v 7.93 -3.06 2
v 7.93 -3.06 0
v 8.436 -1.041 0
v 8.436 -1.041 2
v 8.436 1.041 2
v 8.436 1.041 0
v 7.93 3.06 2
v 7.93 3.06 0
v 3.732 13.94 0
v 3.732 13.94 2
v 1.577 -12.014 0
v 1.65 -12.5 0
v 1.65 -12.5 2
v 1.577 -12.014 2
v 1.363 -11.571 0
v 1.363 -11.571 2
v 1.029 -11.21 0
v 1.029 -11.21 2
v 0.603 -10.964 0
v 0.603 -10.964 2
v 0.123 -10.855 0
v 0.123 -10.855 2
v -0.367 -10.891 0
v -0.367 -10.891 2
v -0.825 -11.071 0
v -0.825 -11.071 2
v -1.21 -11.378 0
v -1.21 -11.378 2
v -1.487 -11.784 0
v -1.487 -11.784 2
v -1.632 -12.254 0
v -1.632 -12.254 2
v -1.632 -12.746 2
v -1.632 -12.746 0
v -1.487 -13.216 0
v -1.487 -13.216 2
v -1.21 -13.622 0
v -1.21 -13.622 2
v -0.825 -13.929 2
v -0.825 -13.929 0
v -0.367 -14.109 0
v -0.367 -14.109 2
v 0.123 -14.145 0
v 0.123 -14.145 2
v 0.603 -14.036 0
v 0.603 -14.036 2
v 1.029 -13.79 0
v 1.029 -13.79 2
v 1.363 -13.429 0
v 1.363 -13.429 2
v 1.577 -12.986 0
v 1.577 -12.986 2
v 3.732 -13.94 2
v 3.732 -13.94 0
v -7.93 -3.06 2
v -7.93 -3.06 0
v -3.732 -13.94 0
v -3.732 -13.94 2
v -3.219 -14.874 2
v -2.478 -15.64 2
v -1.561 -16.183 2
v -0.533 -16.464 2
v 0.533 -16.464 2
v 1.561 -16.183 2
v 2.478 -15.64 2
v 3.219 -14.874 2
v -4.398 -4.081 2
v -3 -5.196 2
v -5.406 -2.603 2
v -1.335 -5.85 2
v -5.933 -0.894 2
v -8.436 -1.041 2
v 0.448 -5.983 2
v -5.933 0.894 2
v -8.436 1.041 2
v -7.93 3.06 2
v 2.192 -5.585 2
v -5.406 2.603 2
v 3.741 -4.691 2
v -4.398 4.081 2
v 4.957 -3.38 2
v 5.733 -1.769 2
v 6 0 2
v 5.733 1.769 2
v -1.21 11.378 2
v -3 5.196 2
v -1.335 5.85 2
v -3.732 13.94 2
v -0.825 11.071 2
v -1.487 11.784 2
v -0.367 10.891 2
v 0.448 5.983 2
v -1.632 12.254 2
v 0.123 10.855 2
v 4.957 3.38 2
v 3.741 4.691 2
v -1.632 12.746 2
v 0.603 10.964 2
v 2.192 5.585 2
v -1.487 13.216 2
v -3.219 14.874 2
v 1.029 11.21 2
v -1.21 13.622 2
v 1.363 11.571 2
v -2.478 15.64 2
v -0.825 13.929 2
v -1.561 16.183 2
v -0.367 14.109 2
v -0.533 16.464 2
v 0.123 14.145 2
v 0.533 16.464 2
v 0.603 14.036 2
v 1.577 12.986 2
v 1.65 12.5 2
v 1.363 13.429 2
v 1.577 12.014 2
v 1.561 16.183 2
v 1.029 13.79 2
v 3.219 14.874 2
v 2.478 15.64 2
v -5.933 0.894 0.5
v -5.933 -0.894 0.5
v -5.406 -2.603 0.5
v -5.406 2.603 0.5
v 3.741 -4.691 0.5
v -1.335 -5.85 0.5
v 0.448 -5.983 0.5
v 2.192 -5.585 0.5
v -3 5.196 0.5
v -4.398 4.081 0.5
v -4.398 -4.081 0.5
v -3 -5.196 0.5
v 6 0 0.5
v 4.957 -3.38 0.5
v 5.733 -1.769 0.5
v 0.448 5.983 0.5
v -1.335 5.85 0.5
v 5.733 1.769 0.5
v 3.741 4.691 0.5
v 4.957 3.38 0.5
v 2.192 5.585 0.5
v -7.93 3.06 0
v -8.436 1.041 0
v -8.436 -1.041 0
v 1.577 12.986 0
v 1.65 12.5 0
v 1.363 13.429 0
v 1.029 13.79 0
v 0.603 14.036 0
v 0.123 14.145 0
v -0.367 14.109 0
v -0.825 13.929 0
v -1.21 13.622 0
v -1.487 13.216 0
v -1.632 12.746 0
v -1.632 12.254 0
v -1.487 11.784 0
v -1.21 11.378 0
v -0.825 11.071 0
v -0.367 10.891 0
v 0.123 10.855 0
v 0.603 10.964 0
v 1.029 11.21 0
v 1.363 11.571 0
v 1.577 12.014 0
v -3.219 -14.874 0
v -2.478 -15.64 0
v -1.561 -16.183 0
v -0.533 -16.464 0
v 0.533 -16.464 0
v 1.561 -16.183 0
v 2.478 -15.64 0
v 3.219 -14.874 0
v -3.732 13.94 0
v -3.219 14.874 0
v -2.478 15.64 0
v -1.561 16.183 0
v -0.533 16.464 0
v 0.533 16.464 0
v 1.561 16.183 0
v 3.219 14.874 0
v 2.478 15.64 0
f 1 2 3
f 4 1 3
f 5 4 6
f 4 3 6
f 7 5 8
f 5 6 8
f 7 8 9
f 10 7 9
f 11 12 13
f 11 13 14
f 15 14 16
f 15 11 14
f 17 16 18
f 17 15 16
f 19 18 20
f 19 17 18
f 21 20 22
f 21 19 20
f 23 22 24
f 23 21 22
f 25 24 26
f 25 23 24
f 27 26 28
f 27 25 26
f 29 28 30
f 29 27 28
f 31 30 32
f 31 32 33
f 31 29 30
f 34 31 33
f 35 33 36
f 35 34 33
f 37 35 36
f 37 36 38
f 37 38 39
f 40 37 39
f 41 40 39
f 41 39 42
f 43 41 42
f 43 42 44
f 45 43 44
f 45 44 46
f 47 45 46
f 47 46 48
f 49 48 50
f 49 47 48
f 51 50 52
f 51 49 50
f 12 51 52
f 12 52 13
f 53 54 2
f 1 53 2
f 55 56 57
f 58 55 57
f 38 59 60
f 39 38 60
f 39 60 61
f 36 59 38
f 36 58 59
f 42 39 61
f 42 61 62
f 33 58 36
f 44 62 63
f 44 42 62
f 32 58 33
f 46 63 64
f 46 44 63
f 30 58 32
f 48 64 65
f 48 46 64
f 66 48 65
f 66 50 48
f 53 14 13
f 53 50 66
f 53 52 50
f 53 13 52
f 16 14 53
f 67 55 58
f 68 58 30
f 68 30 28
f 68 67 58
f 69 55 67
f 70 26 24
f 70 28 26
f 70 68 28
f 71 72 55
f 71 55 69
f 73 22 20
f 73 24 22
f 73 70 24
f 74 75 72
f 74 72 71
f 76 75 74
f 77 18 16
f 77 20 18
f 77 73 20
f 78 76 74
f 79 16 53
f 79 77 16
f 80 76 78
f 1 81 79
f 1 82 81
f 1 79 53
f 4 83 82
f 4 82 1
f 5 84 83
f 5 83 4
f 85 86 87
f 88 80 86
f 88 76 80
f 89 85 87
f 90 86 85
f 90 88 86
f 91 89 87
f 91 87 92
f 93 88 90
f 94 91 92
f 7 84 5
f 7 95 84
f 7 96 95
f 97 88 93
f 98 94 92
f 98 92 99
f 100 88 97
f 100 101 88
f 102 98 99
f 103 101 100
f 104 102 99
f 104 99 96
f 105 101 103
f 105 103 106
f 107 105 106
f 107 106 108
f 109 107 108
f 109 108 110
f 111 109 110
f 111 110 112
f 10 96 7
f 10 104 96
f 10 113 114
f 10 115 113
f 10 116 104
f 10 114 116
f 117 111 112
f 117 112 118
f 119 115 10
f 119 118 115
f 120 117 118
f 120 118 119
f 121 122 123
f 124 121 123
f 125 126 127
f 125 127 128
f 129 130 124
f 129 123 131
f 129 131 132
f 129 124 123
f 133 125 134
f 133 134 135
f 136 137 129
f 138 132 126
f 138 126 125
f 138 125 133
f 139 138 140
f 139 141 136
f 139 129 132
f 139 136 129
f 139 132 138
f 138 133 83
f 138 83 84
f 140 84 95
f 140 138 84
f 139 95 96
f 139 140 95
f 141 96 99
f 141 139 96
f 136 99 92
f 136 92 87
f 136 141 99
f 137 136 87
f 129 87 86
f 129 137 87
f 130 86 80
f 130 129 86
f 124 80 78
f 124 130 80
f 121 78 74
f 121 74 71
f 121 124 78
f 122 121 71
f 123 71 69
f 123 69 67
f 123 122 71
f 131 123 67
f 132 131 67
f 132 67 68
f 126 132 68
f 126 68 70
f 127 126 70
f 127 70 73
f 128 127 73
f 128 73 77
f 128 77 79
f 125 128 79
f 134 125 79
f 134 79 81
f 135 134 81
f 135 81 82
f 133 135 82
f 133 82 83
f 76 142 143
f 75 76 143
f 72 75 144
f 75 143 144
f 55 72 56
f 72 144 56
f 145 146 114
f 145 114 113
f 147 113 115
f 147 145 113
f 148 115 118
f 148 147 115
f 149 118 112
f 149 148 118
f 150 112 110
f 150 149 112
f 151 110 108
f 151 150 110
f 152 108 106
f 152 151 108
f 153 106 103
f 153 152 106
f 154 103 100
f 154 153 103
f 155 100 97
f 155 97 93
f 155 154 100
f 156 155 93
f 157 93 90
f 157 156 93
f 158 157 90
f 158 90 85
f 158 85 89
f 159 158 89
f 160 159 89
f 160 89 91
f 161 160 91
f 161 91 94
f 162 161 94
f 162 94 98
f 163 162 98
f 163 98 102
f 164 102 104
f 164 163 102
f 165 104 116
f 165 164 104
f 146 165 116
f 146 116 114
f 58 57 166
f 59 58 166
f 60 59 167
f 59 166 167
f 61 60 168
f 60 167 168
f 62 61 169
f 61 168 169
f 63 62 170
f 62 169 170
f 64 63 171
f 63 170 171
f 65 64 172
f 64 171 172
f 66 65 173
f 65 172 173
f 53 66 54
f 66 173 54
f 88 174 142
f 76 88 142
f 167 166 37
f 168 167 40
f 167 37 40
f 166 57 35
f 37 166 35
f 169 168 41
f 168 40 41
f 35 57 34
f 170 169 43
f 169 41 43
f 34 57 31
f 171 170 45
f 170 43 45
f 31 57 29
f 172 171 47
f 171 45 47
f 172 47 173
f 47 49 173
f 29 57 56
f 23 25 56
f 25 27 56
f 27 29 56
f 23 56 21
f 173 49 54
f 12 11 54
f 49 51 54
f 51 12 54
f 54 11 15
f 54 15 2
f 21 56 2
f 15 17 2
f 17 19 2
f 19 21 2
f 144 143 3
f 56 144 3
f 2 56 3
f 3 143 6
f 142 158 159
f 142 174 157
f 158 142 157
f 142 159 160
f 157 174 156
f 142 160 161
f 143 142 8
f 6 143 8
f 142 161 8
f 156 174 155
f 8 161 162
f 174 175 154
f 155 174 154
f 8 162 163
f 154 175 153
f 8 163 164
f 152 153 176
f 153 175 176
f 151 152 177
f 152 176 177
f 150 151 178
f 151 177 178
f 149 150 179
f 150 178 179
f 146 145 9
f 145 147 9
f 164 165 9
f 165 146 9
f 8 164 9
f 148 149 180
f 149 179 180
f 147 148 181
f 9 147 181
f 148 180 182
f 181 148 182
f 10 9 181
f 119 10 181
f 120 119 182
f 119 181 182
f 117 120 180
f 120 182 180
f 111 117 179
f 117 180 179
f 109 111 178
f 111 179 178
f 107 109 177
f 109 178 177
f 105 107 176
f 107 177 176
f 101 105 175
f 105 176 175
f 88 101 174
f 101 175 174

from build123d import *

# Parameters (mm, degrees)
F0_R     = 1.65
F0_R_2   = 6
F1_DEPTH = 2
F2_DEPTH = 0.5


with BuildPart() as f1:
    # F0 (on Top) → F1 (new body)
    with BuildSketch(Plane.XY):
        with BuildLine():
            Line((-3.731809, 13.94), (-7.930095, 3.06))
            ThreePointArc((-7.930095, 3.06), (-8.5, 0), (-7.930095, -3.06))
            Line((-7.930095, -3.06), (-3.731809, -13.94))
            ThreePointArc((-3.731809, -13.94), (0, -16.5), (3.731809, -13.94))
            Line((3.731809, -13.94), (7.930095, -3.06))
            ThreePointArc((7.930095, -3.06), (8.5, 0), (7.930095, 3.06))
            Line((7.930095, 3.06), (3.731809, 13.94))
            ThreePointArc((3.731809, 13.94), (0, 16.5), (-3.731809, 13.94))
        make_face()
        with Locations((0, -12.5)):
            Circle(F0_R, mode=Mode.SUBTRACT)
        Circle(F0_R_2, mode=Mode.SUBTRACT)
        with Locations((0, 12.5)):
            Circle(F0_R, mode=Mode.SUBTRACT)
    extrude(amount=F1_DEPTH)

    # F0 (on Top) → F2 (join)
    with BuildSketch(Plane.XY):
        Circle(F0_R_2)
    extrude(amount=F2_DEPTH)


solid = f1.part
